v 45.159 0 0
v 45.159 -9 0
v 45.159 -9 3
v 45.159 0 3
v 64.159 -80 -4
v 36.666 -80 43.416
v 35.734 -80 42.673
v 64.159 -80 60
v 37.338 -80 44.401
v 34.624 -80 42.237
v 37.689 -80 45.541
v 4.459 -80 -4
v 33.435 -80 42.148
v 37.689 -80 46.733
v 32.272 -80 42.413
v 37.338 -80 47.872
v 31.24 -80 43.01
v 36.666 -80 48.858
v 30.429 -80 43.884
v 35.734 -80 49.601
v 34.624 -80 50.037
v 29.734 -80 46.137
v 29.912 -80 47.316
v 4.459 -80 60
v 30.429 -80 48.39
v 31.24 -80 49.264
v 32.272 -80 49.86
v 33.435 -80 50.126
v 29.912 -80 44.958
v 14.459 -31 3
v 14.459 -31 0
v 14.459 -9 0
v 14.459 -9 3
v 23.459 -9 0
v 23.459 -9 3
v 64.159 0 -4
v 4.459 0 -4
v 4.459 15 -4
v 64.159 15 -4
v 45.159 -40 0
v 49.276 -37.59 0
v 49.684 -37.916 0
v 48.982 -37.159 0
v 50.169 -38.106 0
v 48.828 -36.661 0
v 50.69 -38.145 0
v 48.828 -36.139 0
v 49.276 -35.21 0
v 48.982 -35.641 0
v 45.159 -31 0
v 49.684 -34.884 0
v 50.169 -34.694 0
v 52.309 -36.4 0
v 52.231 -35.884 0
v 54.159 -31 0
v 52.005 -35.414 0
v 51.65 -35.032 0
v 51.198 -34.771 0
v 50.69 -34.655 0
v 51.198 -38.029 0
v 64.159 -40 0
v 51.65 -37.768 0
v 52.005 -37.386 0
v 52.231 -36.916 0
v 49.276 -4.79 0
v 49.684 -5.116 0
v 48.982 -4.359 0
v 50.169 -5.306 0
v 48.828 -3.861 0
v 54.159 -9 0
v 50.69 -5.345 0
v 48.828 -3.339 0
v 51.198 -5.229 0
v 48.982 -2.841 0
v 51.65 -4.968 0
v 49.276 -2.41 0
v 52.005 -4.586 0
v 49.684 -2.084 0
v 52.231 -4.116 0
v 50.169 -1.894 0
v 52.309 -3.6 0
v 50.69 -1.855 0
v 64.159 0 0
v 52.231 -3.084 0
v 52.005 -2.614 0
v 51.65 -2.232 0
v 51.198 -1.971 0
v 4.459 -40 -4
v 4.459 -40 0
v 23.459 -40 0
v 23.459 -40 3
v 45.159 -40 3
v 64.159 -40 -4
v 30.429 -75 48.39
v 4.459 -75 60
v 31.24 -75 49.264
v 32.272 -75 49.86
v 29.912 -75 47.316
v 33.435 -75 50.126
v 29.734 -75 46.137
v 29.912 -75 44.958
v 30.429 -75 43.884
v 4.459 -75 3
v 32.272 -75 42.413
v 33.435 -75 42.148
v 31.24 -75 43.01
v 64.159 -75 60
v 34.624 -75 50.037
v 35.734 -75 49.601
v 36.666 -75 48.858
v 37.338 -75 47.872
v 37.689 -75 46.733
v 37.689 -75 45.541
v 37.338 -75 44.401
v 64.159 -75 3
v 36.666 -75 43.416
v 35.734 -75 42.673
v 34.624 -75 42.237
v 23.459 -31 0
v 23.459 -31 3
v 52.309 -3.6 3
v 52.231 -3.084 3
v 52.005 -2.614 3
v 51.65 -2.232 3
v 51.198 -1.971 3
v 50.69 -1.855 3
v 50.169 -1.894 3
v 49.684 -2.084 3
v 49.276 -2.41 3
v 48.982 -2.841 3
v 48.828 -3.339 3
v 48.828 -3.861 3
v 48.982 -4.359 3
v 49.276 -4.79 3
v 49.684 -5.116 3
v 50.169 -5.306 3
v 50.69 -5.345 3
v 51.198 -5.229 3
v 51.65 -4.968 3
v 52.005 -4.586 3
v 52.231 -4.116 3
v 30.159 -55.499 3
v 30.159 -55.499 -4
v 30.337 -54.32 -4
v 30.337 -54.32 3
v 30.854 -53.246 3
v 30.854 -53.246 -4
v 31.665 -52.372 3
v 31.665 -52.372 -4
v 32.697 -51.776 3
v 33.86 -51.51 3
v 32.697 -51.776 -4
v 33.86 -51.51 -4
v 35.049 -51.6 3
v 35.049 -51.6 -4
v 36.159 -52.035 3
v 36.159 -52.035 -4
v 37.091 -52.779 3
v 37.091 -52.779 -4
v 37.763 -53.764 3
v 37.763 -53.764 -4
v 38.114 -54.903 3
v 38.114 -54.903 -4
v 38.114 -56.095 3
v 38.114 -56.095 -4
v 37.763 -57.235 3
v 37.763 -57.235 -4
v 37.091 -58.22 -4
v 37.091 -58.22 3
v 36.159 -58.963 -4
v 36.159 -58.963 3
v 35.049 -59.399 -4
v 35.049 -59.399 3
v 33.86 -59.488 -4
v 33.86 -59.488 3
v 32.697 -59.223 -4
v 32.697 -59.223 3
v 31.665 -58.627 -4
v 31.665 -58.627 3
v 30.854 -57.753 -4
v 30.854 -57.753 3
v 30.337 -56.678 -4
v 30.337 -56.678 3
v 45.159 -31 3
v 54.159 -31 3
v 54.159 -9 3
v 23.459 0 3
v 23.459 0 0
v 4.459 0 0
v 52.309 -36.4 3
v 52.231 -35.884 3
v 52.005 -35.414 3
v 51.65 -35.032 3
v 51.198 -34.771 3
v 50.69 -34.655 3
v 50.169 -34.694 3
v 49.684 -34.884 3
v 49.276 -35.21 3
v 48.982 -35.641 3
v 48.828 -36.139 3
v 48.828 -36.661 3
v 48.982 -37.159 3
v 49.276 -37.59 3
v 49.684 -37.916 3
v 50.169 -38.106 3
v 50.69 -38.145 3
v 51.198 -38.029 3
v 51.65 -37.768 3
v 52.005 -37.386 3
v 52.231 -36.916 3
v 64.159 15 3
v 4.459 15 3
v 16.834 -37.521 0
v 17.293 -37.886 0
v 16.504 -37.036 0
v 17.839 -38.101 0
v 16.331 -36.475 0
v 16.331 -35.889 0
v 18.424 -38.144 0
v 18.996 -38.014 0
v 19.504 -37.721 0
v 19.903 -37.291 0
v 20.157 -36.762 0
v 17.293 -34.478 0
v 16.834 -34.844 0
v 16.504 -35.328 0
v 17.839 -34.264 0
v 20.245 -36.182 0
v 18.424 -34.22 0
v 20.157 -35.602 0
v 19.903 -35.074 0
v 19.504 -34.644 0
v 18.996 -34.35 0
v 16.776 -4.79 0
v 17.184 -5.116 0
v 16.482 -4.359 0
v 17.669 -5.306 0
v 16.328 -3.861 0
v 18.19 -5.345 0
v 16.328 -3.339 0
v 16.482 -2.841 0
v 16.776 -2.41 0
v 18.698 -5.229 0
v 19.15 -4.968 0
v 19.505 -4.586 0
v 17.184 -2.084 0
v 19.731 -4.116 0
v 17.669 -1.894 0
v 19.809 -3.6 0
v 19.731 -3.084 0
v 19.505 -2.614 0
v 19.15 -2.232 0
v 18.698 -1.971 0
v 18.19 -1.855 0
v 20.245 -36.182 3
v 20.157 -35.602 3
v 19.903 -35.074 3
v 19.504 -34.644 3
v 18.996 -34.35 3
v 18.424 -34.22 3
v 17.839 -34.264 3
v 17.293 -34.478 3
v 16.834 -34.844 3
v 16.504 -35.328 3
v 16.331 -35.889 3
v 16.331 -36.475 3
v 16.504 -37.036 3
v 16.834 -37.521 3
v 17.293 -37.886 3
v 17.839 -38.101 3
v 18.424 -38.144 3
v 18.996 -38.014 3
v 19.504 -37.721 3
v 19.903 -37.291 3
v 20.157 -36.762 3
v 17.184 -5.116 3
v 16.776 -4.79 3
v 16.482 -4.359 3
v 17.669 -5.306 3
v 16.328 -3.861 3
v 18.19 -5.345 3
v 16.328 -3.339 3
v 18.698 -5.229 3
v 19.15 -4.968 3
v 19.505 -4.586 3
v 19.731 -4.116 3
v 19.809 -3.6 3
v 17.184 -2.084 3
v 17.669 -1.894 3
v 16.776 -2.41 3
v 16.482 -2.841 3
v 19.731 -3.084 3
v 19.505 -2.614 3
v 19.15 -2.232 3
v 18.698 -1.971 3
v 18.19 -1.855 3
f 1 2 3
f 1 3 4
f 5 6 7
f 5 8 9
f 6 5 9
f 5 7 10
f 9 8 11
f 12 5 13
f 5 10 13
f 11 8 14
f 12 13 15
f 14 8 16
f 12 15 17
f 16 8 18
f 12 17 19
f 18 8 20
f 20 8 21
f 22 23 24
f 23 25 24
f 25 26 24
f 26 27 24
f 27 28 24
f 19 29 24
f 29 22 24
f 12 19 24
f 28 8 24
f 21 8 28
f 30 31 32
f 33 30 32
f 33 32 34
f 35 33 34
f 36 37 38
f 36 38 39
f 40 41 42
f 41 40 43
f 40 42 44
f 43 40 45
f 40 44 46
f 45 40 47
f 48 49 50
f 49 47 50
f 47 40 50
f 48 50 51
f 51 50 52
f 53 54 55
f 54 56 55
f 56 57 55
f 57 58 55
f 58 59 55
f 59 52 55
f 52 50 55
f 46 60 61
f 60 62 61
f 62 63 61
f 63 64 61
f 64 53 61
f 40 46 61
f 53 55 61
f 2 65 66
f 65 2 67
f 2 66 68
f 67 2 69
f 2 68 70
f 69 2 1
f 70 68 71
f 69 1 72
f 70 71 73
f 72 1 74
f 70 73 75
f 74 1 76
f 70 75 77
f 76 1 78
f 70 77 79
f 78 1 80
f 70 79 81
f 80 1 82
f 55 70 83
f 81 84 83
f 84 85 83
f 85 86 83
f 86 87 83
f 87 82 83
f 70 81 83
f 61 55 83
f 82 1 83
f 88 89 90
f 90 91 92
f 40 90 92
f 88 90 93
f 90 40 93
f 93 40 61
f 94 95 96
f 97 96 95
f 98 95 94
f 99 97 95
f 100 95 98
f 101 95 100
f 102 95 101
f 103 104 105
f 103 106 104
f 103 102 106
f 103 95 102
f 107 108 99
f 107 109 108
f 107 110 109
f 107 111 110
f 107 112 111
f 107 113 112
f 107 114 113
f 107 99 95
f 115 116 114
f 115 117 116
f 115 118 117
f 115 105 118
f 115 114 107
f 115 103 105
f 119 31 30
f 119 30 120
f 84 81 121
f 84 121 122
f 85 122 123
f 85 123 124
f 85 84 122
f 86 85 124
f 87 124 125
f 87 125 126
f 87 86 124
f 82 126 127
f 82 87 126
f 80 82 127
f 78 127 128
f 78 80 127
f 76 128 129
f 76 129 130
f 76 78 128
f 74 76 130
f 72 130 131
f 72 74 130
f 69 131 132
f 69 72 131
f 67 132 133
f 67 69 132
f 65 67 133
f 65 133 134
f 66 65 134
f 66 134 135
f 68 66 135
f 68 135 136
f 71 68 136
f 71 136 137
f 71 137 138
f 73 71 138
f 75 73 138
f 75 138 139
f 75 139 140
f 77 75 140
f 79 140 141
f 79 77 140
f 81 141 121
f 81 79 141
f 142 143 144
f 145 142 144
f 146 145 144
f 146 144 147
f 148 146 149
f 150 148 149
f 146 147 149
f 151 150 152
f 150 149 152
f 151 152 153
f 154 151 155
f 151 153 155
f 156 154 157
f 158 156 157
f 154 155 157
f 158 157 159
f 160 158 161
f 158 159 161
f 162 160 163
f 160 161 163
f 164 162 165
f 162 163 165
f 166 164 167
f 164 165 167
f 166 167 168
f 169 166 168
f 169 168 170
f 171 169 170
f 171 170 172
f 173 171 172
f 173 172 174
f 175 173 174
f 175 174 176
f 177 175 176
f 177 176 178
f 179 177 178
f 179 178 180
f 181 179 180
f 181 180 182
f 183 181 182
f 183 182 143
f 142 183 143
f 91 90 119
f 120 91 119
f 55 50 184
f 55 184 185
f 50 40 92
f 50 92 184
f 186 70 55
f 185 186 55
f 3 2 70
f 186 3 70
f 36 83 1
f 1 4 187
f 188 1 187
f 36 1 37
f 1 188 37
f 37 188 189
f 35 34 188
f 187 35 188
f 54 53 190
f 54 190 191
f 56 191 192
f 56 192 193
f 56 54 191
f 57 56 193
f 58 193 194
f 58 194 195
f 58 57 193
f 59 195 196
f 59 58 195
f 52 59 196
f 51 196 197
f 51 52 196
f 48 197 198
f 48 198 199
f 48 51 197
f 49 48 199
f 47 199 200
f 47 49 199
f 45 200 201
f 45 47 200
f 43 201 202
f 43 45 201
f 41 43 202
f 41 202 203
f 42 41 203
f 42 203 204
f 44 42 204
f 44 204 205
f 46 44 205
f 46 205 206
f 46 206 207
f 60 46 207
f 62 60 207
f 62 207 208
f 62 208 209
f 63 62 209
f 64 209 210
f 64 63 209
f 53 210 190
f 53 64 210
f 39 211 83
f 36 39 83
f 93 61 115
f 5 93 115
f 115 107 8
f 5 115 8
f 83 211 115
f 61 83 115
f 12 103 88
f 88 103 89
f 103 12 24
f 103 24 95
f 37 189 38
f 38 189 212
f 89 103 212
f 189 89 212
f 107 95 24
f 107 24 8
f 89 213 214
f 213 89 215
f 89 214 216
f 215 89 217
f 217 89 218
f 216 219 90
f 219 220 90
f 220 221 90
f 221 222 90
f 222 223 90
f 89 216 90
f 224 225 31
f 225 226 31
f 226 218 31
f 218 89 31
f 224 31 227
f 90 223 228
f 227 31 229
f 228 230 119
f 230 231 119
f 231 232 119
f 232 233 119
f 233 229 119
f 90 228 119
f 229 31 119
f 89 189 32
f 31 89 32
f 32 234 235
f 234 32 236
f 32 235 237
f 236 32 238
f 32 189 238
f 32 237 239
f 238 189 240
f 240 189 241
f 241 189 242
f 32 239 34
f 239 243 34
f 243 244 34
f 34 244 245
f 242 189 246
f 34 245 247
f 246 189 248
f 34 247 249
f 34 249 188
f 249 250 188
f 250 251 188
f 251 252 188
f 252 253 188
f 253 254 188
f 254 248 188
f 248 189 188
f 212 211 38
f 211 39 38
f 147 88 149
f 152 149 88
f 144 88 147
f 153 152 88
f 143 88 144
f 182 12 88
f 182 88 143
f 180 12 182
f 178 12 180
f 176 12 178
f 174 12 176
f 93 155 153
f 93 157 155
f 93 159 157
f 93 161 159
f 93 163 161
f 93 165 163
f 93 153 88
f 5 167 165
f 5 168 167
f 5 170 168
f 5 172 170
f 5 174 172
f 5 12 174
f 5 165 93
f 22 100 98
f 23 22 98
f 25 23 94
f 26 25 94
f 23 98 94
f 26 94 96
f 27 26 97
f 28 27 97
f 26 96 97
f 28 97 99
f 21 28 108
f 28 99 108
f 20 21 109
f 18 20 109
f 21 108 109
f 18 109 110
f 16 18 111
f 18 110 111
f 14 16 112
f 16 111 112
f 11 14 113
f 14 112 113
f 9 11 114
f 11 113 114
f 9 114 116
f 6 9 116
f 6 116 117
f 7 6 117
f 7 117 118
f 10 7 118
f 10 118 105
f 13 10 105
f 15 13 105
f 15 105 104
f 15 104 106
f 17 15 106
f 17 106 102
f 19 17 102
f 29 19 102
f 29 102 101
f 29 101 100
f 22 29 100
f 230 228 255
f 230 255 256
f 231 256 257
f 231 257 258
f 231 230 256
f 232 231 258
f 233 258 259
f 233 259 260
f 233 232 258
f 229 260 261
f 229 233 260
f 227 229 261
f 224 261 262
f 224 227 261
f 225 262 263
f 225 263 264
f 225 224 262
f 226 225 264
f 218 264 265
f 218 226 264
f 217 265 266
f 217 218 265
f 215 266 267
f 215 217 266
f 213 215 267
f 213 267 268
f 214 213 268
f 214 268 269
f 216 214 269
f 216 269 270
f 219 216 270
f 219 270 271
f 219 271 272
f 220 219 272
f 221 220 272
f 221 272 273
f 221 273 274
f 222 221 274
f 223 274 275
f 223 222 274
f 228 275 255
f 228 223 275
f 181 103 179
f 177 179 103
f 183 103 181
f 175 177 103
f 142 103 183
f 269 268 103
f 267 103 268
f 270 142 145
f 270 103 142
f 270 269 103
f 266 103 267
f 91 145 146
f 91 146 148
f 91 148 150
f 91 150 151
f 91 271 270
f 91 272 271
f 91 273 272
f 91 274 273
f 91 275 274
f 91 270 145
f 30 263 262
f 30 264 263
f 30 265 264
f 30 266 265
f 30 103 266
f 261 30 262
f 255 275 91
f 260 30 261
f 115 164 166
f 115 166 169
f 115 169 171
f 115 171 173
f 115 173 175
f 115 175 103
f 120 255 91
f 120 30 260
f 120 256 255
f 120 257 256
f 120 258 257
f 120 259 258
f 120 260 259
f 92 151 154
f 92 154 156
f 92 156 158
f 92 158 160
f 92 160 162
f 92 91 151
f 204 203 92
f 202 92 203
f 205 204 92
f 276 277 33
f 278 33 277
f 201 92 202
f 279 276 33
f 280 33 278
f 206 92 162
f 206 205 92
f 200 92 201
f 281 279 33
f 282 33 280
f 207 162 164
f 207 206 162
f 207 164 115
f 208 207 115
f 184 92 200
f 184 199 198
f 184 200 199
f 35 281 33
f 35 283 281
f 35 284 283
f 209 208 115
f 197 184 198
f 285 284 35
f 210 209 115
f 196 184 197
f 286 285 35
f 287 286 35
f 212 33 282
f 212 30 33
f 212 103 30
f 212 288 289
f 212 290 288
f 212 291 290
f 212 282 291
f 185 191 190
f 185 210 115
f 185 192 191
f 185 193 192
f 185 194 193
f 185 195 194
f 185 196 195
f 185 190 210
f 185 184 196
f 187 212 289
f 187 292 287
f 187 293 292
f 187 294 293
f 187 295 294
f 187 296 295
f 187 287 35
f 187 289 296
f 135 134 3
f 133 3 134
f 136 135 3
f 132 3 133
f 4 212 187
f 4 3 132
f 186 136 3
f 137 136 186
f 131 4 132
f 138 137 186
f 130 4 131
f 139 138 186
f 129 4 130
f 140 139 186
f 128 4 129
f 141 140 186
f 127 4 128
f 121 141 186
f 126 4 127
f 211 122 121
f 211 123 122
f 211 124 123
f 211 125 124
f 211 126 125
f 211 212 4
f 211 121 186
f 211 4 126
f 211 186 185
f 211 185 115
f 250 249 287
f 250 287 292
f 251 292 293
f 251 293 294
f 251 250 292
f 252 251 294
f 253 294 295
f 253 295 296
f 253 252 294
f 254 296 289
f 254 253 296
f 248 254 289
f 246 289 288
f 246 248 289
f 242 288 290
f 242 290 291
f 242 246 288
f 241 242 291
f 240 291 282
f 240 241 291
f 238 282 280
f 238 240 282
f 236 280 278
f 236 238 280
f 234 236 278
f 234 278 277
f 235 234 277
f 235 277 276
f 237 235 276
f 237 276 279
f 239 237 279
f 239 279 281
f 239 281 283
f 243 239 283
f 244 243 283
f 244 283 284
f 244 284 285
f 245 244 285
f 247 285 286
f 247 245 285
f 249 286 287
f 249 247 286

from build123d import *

# Parameters (mm, degrees)
F0_W     = 10
F0_H     = 10
F0_W_2   = 9
F0_H_2   = 9
F0_R     = 1.75
F0_R_2   = 1.9678984668
F1_DEPTH = 3
F0_W_3   = 59.7
F0_H_3   = 5
F2_DEPTH = 60
F4_D     = 8
F6_DEPTH = 4
F8_D     = 8


# Not quite as in the source:
# - a feature names something its author has since deleted; it is built from what else it names


with BuildPart() as f1:
    # F0 (on Top) → F1 (new body)
    with BuildSketch(Plane.XY):
        with Locations((9.4588409364, 5)):
            Rectangle(F0_W, F0_H)
        with Locations((59.1588409364, 5)):
            Rectangle(F0_W, F0_H)
        Polygon((14.4588409364, 10), (14.4588409364, 0), (23.4588409364, 0), (45.1588409364, 0), (54.1588409364, 0), (54.1588409364, 10), align=None)
        Polygon((14.4588409364, -9), (14.4588409364, 0), (4.4588409364, 0), (4.4588409364, -40), (14.4588409364, -40), (14.4588409364, -31), align=None)
        Polygon((64.1588409364, 0), (54.1588409364, 0), (54.1588409364, -9), (54.1588409364, -31), (54.1588409364, -40), (64.1588409364, -40), align=None)
        Polygon((14.4588409364, -40), (4.4588409364, -40), (4.4588409364, -50), (4.4588409364, -75), (64.1588409364, -75), (64.1588409364, -50), (64.1588409364, -40), (54.1588409364, -40), (45.1588409364, -40), (23.4588409364, -40), align=None)
        with Locations((18.9588409364, -4.5)):
            Rectangle(F0_W_2, F0_H_2)
        with Locations((18.0588409364, -3.6)):
            Circle(F0_R, mode=Mode.SUBTRACT)
        with Locations((49.6588409364, -4.5)):
            Rectangle(F0_W_2, F0_H_2)
        with Locations((50.5588409364, -3.6)):
            Circle(F0_R, mode=Mode.SUBTRACT)
        with Locations((18.9588409364, -35.5)):
            Rectangle(F0_W_2, F0_H_2)
        with Locations((18.2767394032, -36.1821015332)):
            Circle(F0_R_2, mode=Mode.SUBTRACT)
        with Locations((49.6588409364, -35.5)):
            Rectangle(F0_W_2, F0_H_2)
        with Locations((50.5588409364, -36.4)):
            Circle(F0_R, mode=Mode.SUBTRACT)
        Polygon((4.4588409364, 10), (14.4588409364, 10), (54.1588409364, 10), (64.1588409364, 10), (64.1588409364, 15), (4.4588409364, 15), align=None)
    extrude(amount=F1_DEPTH)

    # F0 (on Top) → F2 (join)
    with BuildSketch(Plane.XY):
        with Locations((34.3088409364, -77.5)):
            Rectangle(F0_W_3, F0_H_3)
    extrude(amount=F2_DEPTH)

    # F4 (through all)
    with Locations(Plane.XZ.offset(80)):
        with Locations((33.7338409364, 46.1369195342)):
            Hole(F4_D / 2)

    # F5 (on face) → F6 (join)
    with BuildSketch(Plane(origin=(0, 0, 0), x_dir=(1, 0, 0), z_dir=(0, 0, -1))):
        Polygon((4.4588409364, 40), (23.4588409364, 40), (45.1588409364, 40), (64.1588409364, 40), (64.1588409364, 80), (4.4588409364, 80), align=None)
        Polygon((23.4588409364, 0), (4.4588409364, 0), (4.4588409364, -10), (4.4588409364, -15), (64.1588409364, -15), (64.1588409364, -10), (64.1588409364, 0), (45.1588409364, 0), align=None)
    extrude(amount=F6_DEPTH)

    # F8 (through all)
    with Locations(Plane.XY.offset(3)):
        with Locations((34.1588409364, -55.4992741766)):
            Hole(F8_D / 2)


solid = f1.part
